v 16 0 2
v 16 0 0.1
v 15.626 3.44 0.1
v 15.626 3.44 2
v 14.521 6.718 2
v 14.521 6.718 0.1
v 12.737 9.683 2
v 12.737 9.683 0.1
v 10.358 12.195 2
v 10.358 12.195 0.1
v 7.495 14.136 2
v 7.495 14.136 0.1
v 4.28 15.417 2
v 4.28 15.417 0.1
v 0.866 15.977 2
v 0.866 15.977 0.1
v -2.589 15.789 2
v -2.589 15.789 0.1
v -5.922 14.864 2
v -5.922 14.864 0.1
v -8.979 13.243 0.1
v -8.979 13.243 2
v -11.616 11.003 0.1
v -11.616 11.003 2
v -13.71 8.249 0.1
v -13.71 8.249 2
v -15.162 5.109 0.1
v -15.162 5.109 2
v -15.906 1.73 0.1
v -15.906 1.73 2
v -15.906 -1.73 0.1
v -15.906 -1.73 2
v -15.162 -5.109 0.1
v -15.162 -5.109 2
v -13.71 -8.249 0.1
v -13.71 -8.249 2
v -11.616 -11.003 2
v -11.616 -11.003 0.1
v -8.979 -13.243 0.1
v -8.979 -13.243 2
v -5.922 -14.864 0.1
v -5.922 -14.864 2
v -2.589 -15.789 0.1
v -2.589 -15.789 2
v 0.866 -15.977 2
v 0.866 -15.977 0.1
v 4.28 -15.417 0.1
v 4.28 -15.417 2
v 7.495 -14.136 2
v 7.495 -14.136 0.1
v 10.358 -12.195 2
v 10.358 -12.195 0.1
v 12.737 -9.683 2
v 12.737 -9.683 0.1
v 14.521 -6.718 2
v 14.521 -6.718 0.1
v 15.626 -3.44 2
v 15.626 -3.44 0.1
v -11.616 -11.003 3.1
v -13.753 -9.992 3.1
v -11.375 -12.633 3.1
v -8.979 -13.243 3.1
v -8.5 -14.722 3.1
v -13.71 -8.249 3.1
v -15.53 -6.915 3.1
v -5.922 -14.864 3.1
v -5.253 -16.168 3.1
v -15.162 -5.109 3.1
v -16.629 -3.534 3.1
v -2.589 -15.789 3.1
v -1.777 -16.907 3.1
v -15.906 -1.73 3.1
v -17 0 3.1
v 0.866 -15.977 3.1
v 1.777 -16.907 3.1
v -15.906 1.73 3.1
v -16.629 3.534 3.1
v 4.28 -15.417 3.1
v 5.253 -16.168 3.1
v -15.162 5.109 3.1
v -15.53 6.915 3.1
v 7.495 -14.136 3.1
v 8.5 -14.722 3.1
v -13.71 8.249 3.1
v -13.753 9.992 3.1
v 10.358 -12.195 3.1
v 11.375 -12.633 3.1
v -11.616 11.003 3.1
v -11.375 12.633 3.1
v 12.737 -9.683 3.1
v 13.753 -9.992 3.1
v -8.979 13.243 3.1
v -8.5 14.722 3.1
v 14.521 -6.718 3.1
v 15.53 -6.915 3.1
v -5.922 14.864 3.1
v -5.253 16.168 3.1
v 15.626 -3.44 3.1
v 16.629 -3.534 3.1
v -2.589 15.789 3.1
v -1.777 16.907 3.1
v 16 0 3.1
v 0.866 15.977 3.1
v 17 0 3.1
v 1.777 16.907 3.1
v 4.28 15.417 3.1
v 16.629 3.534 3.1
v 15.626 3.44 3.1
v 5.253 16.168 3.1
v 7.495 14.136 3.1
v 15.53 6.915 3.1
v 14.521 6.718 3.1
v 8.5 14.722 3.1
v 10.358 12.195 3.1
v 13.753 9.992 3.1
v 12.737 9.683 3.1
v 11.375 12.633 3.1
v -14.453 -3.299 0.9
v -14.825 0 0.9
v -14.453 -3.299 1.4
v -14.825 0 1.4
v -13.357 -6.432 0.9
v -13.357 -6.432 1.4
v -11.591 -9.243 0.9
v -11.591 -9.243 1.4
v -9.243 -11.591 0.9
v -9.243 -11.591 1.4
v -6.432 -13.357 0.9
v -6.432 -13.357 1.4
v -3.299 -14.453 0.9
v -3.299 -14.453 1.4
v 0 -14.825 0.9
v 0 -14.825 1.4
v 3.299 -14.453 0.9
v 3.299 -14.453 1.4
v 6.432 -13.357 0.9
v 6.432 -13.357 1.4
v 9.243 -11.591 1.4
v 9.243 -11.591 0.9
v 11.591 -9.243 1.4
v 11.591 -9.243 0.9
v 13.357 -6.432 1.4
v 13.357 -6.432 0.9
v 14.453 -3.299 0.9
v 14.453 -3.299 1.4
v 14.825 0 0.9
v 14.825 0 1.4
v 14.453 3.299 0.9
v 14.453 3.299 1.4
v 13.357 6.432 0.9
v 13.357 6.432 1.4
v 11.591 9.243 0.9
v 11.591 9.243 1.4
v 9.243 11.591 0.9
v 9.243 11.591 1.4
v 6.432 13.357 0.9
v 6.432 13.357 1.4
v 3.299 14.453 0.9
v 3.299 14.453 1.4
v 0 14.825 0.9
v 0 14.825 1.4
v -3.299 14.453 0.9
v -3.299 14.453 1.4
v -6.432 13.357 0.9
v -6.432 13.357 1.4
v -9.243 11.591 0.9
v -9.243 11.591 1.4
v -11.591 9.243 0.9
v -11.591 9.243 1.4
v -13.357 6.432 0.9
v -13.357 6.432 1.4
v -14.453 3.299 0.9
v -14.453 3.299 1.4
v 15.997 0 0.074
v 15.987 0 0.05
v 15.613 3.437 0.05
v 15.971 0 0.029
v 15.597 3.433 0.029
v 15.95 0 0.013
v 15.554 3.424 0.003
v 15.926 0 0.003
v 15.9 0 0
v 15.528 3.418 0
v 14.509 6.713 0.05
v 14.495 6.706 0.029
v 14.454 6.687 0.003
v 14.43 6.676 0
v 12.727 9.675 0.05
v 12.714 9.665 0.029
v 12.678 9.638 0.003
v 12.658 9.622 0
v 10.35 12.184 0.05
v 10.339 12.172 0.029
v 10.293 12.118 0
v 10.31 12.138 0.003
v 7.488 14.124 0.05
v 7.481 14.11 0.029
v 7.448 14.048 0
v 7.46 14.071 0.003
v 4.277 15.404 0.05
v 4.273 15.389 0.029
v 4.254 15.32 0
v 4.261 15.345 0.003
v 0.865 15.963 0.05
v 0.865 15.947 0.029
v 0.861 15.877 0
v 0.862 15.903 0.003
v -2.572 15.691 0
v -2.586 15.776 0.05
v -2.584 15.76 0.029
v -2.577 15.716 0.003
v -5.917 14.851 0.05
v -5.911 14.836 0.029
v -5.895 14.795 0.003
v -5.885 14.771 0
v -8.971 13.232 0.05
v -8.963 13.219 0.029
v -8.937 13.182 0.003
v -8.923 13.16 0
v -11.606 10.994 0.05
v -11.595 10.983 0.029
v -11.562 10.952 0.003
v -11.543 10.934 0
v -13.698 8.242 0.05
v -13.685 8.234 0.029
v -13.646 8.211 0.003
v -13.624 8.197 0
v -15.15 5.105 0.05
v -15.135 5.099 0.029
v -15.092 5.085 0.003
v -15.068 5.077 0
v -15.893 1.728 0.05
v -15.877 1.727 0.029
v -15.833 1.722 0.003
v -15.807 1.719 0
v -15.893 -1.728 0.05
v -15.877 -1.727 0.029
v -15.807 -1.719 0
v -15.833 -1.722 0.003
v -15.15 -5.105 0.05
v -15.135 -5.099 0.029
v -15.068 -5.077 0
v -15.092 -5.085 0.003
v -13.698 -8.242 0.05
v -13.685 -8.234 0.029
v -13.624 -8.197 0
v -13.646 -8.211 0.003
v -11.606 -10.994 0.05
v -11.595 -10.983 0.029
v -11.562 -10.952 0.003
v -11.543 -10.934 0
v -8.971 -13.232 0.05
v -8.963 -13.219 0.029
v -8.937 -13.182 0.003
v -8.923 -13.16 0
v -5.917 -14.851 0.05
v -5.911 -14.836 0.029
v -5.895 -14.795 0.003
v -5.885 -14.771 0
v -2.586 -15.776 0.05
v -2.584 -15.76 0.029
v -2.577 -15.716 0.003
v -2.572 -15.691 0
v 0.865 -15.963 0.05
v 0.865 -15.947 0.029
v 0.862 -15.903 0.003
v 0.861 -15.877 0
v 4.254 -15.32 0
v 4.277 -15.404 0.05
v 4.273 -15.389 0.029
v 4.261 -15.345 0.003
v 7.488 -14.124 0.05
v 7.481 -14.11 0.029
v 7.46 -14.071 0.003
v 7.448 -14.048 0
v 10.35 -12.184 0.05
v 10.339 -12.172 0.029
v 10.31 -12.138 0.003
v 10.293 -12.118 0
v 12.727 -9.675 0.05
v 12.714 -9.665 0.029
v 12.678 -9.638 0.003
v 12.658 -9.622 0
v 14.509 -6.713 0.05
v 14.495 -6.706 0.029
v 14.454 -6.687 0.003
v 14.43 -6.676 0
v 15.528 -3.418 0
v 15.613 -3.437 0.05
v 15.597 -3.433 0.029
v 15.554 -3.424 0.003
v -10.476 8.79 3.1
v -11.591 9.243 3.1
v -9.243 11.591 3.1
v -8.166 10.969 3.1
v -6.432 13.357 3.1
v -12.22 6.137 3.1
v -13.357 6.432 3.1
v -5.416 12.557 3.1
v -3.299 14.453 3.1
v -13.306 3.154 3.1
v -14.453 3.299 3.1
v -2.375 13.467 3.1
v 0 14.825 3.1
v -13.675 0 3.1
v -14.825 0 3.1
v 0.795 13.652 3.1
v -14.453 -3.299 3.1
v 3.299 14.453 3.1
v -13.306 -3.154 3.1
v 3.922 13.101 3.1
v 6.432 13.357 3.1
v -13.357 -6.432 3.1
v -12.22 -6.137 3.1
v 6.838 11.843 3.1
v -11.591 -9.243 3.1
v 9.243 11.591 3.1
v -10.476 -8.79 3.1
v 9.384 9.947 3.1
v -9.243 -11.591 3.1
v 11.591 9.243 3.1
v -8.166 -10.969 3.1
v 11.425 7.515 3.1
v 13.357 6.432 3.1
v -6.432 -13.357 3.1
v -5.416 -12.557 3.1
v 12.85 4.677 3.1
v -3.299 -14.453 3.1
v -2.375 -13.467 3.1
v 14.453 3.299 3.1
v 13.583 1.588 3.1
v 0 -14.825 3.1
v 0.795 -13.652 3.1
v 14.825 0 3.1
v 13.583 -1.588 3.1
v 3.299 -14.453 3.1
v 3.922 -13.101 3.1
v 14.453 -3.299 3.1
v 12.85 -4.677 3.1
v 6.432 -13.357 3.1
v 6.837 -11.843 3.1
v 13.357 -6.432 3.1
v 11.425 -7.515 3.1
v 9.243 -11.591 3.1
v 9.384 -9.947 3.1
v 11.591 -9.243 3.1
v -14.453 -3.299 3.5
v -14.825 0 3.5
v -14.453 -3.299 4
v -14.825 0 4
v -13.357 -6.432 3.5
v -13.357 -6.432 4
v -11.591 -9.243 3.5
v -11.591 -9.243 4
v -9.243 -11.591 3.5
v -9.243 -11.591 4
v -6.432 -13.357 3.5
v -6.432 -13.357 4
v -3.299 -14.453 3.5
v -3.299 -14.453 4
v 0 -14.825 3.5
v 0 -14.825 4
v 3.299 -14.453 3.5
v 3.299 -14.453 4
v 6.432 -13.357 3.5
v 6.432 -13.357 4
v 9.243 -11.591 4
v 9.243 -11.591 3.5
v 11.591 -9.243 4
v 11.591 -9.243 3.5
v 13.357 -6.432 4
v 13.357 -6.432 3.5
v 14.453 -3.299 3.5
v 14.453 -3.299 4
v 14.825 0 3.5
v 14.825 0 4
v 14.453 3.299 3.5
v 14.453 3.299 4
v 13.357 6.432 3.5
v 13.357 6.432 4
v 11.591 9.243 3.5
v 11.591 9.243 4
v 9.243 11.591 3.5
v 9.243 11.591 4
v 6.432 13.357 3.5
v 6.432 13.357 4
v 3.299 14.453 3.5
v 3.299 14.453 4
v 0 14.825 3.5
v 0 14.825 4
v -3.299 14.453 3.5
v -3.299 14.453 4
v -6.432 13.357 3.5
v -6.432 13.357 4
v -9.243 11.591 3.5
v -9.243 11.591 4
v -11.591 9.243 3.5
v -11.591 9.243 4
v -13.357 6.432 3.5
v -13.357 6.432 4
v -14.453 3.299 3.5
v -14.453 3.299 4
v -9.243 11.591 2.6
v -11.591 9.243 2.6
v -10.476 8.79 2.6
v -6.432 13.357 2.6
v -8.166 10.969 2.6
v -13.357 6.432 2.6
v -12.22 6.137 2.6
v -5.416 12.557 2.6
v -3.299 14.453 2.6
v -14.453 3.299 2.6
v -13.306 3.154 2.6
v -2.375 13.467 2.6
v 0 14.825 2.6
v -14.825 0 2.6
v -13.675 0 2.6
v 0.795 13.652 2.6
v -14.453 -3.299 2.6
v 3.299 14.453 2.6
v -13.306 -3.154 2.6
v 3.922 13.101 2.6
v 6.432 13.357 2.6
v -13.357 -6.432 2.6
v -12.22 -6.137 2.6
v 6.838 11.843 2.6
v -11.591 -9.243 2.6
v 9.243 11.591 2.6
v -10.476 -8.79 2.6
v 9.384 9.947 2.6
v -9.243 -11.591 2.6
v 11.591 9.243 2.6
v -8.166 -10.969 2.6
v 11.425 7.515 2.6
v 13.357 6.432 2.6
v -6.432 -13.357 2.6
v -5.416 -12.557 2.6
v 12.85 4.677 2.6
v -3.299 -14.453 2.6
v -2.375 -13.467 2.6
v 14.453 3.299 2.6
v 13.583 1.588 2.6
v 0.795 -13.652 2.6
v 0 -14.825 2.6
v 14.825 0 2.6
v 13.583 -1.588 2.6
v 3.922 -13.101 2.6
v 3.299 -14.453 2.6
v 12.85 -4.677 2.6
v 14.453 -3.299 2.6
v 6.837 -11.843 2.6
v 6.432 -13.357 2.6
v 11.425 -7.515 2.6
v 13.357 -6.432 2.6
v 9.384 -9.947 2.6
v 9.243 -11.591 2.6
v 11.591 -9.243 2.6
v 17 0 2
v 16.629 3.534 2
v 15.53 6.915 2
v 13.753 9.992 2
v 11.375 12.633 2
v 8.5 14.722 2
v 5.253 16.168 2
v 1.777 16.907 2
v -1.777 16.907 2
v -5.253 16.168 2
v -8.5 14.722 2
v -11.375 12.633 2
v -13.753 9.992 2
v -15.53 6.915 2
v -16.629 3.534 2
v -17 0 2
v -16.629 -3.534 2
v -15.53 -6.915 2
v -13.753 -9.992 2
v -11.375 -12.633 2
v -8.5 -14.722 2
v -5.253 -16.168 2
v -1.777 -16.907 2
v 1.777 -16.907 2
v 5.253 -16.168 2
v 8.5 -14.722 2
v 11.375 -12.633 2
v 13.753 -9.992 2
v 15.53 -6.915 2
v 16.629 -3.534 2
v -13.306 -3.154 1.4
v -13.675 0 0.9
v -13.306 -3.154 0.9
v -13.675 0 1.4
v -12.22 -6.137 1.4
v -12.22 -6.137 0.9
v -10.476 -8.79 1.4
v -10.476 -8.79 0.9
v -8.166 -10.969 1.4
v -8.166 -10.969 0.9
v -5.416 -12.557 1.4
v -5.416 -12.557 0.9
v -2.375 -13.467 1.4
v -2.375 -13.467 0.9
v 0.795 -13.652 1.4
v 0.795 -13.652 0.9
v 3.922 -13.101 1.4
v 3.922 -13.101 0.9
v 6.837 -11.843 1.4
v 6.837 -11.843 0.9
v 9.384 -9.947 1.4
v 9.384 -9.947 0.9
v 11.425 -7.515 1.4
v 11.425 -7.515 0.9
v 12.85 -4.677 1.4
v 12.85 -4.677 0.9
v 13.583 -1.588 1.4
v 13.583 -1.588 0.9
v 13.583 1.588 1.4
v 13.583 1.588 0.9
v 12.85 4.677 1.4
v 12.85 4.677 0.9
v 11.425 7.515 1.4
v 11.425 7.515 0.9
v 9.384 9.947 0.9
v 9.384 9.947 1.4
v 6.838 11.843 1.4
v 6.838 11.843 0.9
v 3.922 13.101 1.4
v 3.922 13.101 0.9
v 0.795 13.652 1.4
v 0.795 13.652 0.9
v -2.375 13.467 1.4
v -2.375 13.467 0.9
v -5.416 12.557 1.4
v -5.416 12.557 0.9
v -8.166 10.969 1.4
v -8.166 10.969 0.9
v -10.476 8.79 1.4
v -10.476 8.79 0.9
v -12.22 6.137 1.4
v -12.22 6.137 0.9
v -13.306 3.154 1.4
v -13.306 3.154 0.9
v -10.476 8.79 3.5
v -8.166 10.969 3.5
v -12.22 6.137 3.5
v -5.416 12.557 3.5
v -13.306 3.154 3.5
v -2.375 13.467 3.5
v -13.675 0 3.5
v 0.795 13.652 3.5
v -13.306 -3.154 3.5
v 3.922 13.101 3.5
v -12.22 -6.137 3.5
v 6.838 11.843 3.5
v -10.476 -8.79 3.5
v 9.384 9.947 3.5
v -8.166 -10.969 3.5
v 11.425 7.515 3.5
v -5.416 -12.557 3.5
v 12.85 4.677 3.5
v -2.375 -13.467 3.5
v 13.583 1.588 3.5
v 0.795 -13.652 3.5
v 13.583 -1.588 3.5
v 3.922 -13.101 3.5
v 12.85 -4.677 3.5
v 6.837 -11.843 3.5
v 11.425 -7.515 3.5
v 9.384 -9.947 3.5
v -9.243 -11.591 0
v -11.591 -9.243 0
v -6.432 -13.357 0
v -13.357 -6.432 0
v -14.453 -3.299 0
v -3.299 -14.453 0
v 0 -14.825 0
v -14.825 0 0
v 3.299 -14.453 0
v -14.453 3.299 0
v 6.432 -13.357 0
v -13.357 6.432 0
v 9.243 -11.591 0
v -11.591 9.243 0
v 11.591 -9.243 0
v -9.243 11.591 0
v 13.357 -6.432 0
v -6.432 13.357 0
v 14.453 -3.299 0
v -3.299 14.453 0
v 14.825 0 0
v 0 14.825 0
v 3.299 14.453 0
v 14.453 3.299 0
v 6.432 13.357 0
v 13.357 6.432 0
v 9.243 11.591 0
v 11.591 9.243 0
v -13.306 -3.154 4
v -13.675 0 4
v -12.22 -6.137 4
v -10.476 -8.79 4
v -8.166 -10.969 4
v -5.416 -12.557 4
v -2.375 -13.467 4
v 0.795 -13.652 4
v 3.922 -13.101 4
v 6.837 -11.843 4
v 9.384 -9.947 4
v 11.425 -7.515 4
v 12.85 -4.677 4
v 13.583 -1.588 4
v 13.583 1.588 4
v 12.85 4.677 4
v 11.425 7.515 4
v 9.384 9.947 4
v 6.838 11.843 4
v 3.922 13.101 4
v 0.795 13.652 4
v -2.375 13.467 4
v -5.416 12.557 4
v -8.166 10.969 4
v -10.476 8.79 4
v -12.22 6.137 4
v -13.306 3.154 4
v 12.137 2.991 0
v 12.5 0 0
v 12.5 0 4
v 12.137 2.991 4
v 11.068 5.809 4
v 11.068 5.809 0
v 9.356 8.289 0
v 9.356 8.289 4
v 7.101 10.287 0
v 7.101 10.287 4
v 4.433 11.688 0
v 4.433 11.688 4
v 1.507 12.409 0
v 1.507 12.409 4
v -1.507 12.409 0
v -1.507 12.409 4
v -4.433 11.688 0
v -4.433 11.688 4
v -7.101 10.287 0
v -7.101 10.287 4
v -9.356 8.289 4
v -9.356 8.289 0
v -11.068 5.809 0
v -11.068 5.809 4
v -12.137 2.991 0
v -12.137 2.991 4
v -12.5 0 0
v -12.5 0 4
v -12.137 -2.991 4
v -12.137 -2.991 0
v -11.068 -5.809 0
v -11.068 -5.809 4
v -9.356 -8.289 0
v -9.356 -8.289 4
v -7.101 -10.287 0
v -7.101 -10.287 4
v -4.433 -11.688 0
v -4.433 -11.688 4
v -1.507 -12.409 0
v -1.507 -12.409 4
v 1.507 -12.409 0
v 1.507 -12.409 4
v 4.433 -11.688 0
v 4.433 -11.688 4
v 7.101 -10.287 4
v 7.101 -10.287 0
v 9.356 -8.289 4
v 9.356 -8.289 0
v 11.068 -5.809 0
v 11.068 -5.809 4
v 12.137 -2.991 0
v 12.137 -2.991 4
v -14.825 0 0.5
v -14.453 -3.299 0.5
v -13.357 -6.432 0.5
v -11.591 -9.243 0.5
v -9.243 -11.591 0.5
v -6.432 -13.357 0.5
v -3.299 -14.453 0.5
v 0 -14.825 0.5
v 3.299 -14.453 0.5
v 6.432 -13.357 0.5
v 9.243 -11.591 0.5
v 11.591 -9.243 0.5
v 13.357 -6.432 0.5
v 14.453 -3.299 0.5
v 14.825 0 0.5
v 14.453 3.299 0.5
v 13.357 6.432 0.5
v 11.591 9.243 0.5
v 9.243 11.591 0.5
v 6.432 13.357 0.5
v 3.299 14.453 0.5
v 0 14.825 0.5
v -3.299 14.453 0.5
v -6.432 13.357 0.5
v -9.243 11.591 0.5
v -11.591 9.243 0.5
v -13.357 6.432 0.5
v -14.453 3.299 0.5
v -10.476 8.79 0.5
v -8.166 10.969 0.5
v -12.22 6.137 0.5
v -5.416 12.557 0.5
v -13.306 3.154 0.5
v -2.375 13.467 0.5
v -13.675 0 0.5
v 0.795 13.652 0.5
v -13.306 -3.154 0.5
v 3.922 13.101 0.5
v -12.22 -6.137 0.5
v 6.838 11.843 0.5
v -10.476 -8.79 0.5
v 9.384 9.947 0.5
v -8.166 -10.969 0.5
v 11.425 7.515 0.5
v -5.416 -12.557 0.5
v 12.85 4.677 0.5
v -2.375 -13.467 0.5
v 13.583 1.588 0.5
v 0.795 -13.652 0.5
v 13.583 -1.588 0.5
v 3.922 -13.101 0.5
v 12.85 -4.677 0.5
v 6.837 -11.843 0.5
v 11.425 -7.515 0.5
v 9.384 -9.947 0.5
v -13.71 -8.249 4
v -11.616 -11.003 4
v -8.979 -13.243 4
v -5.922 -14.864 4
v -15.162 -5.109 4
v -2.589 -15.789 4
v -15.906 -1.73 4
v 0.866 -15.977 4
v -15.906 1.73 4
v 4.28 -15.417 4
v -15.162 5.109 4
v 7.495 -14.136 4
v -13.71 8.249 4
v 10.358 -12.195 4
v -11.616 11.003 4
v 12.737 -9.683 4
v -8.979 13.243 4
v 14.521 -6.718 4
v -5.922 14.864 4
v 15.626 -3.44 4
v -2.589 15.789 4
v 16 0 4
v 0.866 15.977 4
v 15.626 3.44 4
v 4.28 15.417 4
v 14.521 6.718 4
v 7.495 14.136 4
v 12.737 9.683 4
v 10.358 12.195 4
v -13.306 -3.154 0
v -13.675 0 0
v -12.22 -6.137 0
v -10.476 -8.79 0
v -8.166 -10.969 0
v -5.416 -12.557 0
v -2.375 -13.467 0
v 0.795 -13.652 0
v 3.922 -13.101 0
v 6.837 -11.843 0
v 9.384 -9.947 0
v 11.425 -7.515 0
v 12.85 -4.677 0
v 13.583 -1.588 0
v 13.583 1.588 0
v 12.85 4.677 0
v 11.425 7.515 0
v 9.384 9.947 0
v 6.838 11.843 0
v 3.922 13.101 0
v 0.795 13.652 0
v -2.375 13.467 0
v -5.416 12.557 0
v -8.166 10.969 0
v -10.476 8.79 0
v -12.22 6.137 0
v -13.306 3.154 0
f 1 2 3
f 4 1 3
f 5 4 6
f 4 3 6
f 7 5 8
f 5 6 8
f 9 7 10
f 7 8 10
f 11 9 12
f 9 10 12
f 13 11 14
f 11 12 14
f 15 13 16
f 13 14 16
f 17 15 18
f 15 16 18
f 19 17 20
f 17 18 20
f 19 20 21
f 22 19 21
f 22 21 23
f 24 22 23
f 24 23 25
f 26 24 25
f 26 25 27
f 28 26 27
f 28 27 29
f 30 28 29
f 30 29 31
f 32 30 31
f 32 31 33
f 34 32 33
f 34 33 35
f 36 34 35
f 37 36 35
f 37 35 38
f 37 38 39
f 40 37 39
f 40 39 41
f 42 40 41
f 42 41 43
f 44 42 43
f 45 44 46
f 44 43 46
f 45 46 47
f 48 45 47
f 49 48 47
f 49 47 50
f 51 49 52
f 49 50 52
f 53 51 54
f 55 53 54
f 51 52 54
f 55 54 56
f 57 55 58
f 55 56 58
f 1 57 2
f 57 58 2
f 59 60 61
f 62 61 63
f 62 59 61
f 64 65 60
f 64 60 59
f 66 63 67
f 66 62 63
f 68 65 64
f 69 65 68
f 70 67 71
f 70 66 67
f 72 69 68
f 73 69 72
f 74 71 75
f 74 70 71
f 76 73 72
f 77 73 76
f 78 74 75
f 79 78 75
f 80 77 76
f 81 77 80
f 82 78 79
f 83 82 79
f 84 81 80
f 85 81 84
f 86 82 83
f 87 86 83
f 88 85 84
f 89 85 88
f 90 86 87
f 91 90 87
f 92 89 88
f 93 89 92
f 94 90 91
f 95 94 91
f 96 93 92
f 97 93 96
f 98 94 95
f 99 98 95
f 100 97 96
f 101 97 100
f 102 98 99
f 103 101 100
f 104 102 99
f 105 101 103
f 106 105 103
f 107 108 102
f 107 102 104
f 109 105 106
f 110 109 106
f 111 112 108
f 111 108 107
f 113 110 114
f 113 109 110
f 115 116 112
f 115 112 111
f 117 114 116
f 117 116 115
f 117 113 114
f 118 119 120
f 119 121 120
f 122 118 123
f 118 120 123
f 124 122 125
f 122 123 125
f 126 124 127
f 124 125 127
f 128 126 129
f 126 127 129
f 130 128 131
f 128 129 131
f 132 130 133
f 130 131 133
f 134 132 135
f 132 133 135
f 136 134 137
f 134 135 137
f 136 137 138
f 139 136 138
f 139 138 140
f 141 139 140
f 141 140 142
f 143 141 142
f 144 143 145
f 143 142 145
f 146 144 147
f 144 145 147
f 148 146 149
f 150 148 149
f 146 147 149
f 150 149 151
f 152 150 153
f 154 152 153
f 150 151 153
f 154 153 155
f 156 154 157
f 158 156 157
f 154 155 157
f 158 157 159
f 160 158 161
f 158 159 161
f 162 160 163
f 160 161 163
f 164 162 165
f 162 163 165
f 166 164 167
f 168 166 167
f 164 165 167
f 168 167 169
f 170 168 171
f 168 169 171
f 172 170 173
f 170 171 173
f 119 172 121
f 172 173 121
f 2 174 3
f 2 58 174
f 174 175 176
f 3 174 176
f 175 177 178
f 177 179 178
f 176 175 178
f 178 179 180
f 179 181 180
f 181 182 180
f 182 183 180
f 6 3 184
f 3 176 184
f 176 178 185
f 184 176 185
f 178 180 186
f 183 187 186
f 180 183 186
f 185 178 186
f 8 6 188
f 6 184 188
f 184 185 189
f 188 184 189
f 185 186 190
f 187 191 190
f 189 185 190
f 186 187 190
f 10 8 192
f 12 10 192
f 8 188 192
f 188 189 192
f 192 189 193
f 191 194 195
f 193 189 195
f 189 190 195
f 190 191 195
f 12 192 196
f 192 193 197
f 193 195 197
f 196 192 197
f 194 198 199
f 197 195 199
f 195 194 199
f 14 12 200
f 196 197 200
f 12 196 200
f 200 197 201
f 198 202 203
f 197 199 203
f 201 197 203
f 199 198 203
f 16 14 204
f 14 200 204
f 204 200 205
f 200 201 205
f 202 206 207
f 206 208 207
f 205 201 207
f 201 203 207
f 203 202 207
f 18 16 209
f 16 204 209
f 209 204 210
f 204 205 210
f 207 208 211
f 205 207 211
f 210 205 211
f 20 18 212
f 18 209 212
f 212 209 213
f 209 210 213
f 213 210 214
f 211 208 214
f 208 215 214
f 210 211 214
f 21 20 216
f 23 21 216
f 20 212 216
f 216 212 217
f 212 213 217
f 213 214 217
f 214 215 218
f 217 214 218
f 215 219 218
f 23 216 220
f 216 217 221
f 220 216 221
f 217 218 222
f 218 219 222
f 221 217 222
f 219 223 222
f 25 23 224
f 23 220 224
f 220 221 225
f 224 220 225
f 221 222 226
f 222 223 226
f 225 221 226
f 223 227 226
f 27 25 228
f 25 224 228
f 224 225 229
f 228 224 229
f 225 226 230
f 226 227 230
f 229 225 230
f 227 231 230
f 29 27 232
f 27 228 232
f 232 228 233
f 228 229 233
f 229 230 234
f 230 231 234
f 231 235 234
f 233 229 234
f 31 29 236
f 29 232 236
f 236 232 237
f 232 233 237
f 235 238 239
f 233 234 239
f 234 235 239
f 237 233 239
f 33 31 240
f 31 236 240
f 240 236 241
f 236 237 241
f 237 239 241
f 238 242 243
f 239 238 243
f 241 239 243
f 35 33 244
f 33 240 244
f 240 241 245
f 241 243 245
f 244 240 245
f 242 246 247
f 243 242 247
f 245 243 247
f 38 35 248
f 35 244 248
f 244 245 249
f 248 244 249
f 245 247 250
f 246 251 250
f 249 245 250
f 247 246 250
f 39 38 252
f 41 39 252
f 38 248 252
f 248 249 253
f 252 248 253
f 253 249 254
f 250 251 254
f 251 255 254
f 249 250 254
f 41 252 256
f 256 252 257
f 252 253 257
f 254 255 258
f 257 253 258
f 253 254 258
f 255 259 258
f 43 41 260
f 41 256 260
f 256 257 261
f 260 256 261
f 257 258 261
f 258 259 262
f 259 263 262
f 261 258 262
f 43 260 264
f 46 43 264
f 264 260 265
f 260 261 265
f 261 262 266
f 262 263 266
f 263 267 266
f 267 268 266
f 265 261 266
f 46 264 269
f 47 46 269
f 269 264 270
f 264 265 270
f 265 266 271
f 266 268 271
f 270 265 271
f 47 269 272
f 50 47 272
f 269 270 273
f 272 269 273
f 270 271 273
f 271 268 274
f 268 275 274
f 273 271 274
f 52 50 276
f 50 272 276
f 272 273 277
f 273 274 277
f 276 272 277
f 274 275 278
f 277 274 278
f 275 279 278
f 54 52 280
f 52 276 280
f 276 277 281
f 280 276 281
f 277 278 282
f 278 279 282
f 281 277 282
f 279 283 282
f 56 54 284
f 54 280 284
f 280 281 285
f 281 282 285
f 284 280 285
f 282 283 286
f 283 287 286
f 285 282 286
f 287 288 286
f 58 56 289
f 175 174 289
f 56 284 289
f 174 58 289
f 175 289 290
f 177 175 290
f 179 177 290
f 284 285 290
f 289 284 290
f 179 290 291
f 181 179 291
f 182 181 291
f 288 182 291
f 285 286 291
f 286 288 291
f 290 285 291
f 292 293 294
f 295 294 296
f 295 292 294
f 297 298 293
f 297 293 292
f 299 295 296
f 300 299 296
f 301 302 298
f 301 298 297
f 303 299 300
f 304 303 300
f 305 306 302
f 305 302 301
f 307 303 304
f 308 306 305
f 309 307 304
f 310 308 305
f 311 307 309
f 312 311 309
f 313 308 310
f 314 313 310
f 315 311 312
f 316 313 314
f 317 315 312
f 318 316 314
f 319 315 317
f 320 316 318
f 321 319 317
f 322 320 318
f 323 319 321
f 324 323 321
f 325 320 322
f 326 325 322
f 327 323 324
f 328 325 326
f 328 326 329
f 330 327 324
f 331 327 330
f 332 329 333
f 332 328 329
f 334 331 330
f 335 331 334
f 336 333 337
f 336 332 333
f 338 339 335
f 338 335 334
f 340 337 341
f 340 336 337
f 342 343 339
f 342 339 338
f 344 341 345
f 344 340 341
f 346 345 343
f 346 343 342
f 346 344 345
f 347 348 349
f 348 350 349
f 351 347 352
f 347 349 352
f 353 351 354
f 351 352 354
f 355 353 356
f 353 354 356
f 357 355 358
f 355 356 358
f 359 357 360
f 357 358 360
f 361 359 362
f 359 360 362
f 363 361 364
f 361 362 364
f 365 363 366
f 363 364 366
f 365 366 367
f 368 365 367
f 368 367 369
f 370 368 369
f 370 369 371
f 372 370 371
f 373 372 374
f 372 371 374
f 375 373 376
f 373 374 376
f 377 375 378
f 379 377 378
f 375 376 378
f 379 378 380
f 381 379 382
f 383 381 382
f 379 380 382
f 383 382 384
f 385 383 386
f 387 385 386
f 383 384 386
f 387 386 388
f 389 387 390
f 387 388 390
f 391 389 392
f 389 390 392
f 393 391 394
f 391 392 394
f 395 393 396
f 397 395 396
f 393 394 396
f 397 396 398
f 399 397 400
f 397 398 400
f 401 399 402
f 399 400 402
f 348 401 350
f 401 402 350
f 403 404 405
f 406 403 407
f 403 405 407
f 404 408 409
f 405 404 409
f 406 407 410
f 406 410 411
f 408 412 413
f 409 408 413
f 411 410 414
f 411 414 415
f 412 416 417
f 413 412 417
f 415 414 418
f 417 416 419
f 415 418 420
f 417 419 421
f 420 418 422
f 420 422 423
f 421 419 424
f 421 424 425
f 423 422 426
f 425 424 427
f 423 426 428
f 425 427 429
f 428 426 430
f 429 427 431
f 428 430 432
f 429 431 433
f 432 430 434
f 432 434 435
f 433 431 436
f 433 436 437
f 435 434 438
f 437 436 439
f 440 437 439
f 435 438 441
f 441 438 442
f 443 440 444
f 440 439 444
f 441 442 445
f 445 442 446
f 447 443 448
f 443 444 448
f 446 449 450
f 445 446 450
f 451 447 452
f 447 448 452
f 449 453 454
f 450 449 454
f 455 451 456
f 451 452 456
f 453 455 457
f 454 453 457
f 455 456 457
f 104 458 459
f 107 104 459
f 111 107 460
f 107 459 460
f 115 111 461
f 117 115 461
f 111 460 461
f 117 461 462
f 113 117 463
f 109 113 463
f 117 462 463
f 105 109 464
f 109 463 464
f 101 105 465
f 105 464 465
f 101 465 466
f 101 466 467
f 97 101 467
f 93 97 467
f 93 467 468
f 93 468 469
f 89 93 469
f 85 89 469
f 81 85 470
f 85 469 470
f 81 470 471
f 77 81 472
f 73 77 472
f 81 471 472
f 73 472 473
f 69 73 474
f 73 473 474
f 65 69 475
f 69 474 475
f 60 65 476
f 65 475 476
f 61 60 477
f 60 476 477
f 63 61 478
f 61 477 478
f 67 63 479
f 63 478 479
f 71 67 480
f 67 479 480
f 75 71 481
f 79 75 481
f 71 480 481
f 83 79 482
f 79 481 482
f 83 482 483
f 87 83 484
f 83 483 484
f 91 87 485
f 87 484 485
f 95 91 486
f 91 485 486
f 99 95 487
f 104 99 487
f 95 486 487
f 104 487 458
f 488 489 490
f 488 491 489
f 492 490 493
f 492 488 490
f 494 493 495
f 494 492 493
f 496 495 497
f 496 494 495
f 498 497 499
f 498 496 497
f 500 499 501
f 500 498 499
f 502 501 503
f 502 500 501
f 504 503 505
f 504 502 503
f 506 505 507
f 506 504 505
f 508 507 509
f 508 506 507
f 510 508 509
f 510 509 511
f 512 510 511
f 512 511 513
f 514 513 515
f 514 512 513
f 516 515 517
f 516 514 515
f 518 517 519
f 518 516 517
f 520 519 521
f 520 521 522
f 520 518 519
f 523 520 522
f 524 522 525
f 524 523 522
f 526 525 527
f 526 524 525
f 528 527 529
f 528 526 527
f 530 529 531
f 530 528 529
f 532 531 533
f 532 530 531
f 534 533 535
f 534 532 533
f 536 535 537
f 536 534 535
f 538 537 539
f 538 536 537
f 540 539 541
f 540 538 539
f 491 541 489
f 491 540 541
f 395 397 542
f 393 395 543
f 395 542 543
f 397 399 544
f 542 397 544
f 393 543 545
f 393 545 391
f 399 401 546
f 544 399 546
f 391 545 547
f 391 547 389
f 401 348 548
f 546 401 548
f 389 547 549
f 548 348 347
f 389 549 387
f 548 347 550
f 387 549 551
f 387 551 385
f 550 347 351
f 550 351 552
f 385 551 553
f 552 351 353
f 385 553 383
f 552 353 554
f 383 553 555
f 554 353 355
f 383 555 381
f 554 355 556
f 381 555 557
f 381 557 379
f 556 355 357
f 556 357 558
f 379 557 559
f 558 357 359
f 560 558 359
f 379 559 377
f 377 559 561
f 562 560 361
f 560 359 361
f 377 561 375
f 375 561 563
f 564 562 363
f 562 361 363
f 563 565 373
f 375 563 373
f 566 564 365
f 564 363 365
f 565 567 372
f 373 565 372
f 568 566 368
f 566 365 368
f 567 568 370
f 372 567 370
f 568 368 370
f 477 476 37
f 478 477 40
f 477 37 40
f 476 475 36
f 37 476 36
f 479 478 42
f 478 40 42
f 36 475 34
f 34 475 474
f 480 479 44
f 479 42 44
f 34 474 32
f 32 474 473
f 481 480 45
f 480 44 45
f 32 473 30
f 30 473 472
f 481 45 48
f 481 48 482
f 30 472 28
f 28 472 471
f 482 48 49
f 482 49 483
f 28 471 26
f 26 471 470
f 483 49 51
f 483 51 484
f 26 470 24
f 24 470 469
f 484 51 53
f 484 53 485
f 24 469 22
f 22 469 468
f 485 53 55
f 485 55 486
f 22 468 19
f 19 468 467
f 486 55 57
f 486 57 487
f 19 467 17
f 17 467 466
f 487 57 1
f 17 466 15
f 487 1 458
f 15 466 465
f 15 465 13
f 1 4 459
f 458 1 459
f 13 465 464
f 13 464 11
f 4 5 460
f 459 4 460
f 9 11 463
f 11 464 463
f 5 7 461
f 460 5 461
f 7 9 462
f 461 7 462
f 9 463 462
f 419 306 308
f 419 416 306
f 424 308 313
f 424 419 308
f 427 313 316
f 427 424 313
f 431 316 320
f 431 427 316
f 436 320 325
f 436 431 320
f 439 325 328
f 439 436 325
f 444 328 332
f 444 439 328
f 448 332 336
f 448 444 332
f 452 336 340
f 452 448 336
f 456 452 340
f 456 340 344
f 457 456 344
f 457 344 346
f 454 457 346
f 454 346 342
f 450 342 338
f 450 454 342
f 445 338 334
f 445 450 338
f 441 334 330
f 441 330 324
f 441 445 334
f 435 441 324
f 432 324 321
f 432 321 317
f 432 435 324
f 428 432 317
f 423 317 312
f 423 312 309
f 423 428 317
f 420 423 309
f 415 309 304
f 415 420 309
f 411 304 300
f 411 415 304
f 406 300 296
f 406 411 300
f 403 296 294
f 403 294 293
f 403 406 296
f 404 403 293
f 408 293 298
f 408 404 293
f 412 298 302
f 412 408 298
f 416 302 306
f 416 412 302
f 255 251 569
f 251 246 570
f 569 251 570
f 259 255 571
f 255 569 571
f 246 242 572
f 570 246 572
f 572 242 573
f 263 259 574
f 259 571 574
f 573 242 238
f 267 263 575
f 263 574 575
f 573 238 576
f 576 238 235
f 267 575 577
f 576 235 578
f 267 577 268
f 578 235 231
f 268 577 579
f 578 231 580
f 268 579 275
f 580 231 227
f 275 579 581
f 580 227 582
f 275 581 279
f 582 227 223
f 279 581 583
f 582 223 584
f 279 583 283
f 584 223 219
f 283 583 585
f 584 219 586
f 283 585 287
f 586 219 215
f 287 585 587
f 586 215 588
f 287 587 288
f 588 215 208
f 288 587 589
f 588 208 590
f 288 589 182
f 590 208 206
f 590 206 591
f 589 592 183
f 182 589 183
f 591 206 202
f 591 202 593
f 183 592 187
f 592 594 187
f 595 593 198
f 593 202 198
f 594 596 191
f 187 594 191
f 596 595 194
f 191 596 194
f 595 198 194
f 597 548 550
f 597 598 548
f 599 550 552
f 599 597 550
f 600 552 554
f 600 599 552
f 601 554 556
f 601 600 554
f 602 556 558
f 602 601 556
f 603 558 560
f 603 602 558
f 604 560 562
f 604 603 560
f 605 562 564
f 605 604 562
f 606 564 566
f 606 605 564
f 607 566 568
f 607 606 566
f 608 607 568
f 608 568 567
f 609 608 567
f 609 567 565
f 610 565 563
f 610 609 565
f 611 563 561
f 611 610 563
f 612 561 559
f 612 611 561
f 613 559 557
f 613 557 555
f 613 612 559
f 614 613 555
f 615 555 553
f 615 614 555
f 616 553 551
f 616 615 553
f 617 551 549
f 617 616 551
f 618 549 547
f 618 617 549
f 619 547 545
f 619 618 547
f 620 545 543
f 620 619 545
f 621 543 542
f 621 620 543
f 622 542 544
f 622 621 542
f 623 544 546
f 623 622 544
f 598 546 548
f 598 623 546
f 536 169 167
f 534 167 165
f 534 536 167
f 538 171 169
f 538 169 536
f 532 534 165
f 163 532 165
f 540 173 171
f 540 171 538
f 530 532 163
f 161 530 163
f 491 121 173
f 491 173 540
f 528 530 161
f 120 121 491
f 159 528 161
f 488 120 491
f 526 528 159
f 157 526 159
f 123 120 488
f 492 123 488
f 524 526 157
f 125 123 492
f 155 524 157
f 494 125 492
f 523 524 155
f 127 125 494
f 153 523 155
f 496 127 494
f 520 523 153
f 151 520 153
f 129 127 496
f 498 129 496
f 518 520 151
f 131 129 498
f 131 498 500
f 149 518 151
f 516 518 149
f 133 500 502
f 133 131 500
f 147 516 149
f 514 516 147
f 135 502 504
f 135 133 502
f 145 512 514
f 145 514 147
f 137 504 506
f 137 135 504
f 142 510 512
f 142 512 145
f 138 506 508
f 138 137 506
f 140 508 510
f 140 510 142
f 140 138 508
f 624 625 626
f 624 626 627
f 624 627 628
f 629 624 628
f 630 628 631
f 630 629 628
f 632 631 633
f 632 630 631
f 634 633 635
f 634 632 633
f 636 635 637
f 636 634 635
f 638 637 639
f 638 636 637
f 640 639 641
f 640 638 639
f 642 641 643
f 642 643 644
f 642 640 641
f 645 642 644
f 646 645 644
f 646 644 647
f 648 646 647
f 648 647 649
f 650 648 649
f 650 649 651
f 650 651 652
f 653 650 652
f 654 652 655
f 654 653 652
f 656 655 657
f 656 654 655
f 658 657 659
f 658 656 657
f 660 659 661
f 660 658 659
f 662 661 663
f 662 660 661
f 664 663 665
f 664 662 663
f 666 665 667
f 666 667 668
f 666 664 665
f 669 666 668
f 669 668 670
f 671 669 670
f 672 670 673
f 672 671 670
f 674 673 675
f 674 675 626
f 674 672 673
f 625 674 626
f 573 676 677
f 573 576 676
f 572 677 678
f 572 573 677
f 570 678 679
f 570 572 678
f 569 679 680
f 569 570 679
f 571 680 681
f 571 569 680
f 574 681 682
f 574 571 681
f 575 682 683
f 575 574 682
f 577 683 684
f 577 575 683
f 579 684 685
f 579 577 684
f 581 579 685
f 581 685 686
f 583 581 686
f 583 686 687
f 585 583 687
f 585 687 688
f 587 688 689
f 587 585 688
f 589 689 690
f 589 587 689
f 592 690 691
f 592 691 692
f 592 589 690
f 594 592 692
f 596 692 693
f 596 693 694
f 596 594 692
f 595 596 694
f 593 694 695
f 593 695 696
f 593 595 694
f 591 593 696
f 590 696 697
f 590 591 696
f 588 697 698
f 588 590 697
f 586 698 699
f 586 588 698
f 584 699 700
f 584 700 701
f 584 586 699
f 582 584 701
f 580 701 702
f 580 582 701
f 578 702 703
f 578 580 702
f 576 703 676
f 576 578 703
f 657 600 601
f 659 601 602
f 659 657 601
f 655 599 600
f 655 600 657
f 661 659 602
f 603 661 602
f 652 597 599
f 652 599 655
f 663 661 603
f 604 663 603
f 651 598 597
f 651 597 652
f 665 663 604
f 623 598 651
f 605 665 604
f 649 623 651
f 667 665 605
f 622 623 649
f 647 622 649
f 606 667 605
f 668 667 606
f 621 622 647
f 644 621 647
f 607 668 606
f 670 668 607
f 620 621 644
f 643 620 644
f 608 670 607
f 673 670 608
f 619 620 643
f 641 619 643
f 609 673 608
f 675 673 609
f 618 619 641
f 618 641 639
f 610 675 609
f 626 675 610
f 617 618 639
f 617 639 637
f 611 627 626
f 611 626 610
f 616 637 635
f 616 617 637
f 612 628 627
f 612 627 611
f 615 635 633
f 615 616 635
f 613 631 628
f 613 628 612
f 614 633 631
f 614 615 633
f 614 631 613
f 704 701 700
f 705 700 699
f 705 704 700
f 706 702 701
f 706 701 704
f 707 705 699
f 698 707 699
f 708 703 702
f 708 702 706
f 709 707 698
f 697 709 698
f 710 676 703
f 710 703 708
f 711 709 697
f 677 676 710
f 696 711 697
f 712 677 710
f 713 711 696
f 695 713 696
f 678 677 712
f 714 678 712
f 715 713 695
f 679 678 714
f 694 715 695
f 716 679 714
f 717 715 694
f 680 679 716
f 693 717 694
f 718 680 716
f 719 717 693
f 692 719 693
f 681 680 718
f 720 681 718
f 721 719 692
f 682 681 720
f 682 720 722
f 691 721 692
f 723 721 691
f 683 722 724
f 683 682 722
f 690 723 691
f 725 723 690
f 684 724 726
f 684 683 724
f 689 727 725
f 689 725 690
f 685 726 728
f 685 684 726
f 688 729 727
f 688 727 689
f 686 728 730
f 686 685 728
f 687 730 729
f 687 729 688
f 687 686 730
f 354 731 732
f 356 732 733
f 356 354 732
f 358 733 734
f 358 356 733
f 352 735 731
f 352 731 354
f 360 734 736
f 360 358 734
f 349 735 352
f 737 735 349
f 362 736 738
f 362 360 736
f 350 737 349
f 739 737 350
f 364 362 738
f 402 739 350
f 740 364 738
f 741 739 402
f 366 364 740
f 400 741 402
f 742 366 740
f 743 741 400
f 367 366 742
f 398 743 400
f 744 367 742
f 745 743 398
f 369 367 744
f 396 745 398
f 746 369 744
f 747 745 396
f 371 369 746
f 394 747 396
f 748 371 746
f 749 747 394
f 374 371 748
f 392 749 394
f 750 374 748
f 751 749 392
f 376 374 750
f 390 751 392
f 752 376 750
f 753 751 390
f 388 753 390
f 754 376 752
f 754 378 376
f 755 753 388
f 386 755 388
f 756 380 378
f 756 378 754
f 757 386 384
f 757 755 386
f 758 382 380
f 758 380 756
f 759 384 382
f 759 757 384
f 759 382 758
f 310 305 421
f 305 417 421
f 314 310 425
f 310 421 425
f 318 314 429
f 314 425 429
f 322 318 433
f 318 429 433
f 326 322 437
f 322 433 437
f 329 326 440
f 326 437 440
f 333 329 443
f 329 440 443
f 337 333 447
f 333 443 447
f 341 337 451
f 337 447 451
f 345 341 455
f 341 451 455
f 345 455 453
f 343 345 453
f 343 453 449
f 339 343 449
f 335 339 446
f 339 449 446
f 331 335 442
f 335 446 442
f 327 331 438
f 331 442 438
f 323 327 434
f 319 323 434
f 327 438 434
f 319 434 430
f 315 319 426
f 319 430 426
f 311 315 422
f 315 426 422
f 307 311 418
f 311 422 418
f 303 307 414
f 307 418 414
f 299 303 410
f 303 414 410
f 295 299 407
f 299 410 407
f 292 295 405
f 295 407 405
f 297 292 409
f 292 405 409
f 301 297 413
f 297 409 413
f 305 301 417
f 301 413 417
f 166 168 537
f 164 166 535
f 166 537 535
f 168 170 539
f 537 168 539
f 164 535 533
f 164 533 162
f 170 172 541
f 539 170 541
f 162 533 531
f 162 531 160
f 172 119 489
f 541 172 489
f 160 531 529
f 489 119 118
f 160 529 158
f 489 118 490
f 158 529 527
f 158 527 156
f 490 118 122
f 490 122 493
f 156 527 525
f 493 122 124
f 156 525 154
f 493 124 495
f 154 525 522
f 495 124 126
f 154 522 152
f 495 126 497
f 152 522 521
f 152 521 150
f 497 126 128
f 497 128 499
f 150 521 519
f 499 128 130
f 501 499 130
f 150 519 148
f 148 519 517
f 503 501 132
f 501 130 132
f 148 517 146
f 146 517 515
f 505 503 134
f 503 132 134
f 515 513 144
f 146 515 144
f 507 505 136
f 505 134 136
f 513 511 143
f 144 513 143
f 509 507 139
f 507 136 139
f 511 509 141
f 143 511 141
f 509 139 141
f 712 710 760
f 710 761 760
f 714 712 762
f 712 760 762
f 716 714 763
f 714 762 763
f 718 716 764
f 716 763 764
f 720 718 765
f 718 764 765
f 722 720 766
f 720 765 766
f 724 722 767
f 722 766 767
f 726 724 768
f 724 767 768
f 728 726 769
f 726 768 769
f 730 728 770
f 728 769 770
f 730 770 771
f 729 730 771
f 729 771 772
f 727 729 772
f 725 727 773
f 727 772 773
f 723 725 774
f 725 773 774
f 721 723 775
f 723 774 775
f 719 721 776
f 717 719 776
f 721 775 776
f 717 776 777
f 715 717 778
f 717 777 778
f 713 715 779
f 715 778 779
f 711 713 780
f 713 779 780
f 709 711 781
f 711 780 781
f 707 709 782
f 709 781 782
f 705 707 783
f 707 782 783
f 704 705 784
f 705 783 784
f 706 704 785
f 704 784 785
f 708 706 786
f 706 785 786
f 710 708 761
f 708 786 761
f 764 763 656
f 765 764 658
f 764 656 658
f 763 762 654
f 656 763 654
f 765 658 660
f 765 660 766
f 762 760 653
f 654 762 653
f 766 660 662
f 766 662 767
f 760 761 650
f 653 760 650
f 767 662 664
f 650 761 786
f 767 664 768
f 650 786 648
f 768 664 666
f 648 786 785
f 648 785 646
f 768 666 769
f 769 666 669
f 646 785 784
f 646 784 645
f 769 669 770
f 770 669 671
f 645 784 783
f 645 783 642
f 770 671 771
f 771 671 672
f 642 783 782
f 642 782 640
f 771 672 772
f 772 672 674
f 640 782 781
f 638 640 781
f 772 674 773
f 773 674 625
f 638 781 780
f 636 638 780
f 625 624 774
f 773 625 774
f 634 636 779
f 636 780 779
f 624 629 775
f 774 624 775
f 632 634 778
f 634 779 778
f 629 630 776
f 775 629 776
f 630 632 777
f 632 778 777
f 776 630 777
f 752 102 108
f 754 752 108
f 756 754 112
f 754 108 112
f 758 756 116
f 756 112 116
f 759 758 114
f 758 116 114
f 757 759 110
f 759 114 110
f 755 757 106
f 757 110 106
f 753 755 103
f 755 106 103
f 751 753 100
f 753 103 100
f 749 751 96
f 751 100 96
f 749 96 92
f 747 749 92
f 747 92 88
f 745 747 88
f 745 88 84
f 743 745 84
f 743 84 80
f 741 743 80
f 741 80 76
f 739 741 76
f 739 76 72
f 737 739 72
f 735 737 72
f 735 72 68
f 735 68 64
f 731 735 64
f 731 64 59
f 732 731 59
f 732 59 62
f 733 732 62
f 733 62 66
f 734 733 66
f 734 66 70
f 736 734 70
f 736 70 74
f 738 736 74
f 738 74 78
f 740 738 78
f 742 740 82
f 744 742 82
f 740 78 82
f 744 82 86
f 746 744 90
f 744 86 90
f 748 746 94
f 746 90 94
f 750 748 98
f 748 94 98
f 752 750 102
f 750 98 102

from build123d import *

# Parameters (mm, degrees)
SKETCH_1_R      = 16
SKETCH_1_R_2    = 12.5
EXTRUDE_1_DEPTH = 4
EXTRUDE_START   = -2
SKETCH_2_R      = 17
SKETCH_2_R_2    = 16
EXTRUDE_2_DEPTH = 1.1
FILLET_1_R      = 0.1
SKETCH_3_W      = 0.5
SKETCH_3_H      = 1.15


with BuildPart() as part:
    # 草图1 → 凸台-拉伸1 (new body)
    with BuildSketch(Plane.XY):
        Circle(SKETCH_1_R)
        Circle(SKETCH_1_R_2, mode=Mode.SUBTRACT)
    extrude(amount=EXTRUDE_1_DEPTH)

    # 草图2 → 凸台-拉伸2 (add)
    with BuildSketch(Plane.XY.offset(4).offset(EXTRUDE_START)):
        Circle(SKETCH_2_R)
        Circle(SKETCH_2_R_2, mode=Mode.SUBTRACT)
    extrude(amount=EXTRUDE_2_DEPTH)

    # 圆角1
    fillet_1_edges = [part.edges().sort_by_distance(p)[0] for p in [
        (-16, 0, 0),
    ]]
    fillet(fillet_1_edges, radius=FILLET_1_R)

    # 草图3 → 切除-旋转1 (revolve, cut)
    with BuildSketch(Plane(origin=(0, 0, 0), x_dir=(0, 0, -1), z_dir=(1, 0, 0)), mode=Mode.PRIVATE) as cut_revolve_1_sk:
        with Locations((-0.25, 14.25)):
            Rectangle(SKETCH_3_W, SKETCH_3_H)
        with Locations((-2.85, 14.25)):
            Rectangle(SKETCH_3_W, SKETCH_3_H)
    cut_revolve_1 = revolve(cut_revolve_1_sk.sketch.rotate(Axis((0, 0, 0), (0, 0, 1)), 90), axis=Axis((0, 0, 0), (0, 0, 1)), mode=Mode.SUBTRACT)

    # 镜向1: 切除-旋转1 across plane
    add(cut_revolve_1.mirror(Plane(origin=(0, 0, 2), x_dir=(1, 0, 0), z_dir=(0, 0, -1))), mode=Mode.SUBTRACT)


solid = part.part
